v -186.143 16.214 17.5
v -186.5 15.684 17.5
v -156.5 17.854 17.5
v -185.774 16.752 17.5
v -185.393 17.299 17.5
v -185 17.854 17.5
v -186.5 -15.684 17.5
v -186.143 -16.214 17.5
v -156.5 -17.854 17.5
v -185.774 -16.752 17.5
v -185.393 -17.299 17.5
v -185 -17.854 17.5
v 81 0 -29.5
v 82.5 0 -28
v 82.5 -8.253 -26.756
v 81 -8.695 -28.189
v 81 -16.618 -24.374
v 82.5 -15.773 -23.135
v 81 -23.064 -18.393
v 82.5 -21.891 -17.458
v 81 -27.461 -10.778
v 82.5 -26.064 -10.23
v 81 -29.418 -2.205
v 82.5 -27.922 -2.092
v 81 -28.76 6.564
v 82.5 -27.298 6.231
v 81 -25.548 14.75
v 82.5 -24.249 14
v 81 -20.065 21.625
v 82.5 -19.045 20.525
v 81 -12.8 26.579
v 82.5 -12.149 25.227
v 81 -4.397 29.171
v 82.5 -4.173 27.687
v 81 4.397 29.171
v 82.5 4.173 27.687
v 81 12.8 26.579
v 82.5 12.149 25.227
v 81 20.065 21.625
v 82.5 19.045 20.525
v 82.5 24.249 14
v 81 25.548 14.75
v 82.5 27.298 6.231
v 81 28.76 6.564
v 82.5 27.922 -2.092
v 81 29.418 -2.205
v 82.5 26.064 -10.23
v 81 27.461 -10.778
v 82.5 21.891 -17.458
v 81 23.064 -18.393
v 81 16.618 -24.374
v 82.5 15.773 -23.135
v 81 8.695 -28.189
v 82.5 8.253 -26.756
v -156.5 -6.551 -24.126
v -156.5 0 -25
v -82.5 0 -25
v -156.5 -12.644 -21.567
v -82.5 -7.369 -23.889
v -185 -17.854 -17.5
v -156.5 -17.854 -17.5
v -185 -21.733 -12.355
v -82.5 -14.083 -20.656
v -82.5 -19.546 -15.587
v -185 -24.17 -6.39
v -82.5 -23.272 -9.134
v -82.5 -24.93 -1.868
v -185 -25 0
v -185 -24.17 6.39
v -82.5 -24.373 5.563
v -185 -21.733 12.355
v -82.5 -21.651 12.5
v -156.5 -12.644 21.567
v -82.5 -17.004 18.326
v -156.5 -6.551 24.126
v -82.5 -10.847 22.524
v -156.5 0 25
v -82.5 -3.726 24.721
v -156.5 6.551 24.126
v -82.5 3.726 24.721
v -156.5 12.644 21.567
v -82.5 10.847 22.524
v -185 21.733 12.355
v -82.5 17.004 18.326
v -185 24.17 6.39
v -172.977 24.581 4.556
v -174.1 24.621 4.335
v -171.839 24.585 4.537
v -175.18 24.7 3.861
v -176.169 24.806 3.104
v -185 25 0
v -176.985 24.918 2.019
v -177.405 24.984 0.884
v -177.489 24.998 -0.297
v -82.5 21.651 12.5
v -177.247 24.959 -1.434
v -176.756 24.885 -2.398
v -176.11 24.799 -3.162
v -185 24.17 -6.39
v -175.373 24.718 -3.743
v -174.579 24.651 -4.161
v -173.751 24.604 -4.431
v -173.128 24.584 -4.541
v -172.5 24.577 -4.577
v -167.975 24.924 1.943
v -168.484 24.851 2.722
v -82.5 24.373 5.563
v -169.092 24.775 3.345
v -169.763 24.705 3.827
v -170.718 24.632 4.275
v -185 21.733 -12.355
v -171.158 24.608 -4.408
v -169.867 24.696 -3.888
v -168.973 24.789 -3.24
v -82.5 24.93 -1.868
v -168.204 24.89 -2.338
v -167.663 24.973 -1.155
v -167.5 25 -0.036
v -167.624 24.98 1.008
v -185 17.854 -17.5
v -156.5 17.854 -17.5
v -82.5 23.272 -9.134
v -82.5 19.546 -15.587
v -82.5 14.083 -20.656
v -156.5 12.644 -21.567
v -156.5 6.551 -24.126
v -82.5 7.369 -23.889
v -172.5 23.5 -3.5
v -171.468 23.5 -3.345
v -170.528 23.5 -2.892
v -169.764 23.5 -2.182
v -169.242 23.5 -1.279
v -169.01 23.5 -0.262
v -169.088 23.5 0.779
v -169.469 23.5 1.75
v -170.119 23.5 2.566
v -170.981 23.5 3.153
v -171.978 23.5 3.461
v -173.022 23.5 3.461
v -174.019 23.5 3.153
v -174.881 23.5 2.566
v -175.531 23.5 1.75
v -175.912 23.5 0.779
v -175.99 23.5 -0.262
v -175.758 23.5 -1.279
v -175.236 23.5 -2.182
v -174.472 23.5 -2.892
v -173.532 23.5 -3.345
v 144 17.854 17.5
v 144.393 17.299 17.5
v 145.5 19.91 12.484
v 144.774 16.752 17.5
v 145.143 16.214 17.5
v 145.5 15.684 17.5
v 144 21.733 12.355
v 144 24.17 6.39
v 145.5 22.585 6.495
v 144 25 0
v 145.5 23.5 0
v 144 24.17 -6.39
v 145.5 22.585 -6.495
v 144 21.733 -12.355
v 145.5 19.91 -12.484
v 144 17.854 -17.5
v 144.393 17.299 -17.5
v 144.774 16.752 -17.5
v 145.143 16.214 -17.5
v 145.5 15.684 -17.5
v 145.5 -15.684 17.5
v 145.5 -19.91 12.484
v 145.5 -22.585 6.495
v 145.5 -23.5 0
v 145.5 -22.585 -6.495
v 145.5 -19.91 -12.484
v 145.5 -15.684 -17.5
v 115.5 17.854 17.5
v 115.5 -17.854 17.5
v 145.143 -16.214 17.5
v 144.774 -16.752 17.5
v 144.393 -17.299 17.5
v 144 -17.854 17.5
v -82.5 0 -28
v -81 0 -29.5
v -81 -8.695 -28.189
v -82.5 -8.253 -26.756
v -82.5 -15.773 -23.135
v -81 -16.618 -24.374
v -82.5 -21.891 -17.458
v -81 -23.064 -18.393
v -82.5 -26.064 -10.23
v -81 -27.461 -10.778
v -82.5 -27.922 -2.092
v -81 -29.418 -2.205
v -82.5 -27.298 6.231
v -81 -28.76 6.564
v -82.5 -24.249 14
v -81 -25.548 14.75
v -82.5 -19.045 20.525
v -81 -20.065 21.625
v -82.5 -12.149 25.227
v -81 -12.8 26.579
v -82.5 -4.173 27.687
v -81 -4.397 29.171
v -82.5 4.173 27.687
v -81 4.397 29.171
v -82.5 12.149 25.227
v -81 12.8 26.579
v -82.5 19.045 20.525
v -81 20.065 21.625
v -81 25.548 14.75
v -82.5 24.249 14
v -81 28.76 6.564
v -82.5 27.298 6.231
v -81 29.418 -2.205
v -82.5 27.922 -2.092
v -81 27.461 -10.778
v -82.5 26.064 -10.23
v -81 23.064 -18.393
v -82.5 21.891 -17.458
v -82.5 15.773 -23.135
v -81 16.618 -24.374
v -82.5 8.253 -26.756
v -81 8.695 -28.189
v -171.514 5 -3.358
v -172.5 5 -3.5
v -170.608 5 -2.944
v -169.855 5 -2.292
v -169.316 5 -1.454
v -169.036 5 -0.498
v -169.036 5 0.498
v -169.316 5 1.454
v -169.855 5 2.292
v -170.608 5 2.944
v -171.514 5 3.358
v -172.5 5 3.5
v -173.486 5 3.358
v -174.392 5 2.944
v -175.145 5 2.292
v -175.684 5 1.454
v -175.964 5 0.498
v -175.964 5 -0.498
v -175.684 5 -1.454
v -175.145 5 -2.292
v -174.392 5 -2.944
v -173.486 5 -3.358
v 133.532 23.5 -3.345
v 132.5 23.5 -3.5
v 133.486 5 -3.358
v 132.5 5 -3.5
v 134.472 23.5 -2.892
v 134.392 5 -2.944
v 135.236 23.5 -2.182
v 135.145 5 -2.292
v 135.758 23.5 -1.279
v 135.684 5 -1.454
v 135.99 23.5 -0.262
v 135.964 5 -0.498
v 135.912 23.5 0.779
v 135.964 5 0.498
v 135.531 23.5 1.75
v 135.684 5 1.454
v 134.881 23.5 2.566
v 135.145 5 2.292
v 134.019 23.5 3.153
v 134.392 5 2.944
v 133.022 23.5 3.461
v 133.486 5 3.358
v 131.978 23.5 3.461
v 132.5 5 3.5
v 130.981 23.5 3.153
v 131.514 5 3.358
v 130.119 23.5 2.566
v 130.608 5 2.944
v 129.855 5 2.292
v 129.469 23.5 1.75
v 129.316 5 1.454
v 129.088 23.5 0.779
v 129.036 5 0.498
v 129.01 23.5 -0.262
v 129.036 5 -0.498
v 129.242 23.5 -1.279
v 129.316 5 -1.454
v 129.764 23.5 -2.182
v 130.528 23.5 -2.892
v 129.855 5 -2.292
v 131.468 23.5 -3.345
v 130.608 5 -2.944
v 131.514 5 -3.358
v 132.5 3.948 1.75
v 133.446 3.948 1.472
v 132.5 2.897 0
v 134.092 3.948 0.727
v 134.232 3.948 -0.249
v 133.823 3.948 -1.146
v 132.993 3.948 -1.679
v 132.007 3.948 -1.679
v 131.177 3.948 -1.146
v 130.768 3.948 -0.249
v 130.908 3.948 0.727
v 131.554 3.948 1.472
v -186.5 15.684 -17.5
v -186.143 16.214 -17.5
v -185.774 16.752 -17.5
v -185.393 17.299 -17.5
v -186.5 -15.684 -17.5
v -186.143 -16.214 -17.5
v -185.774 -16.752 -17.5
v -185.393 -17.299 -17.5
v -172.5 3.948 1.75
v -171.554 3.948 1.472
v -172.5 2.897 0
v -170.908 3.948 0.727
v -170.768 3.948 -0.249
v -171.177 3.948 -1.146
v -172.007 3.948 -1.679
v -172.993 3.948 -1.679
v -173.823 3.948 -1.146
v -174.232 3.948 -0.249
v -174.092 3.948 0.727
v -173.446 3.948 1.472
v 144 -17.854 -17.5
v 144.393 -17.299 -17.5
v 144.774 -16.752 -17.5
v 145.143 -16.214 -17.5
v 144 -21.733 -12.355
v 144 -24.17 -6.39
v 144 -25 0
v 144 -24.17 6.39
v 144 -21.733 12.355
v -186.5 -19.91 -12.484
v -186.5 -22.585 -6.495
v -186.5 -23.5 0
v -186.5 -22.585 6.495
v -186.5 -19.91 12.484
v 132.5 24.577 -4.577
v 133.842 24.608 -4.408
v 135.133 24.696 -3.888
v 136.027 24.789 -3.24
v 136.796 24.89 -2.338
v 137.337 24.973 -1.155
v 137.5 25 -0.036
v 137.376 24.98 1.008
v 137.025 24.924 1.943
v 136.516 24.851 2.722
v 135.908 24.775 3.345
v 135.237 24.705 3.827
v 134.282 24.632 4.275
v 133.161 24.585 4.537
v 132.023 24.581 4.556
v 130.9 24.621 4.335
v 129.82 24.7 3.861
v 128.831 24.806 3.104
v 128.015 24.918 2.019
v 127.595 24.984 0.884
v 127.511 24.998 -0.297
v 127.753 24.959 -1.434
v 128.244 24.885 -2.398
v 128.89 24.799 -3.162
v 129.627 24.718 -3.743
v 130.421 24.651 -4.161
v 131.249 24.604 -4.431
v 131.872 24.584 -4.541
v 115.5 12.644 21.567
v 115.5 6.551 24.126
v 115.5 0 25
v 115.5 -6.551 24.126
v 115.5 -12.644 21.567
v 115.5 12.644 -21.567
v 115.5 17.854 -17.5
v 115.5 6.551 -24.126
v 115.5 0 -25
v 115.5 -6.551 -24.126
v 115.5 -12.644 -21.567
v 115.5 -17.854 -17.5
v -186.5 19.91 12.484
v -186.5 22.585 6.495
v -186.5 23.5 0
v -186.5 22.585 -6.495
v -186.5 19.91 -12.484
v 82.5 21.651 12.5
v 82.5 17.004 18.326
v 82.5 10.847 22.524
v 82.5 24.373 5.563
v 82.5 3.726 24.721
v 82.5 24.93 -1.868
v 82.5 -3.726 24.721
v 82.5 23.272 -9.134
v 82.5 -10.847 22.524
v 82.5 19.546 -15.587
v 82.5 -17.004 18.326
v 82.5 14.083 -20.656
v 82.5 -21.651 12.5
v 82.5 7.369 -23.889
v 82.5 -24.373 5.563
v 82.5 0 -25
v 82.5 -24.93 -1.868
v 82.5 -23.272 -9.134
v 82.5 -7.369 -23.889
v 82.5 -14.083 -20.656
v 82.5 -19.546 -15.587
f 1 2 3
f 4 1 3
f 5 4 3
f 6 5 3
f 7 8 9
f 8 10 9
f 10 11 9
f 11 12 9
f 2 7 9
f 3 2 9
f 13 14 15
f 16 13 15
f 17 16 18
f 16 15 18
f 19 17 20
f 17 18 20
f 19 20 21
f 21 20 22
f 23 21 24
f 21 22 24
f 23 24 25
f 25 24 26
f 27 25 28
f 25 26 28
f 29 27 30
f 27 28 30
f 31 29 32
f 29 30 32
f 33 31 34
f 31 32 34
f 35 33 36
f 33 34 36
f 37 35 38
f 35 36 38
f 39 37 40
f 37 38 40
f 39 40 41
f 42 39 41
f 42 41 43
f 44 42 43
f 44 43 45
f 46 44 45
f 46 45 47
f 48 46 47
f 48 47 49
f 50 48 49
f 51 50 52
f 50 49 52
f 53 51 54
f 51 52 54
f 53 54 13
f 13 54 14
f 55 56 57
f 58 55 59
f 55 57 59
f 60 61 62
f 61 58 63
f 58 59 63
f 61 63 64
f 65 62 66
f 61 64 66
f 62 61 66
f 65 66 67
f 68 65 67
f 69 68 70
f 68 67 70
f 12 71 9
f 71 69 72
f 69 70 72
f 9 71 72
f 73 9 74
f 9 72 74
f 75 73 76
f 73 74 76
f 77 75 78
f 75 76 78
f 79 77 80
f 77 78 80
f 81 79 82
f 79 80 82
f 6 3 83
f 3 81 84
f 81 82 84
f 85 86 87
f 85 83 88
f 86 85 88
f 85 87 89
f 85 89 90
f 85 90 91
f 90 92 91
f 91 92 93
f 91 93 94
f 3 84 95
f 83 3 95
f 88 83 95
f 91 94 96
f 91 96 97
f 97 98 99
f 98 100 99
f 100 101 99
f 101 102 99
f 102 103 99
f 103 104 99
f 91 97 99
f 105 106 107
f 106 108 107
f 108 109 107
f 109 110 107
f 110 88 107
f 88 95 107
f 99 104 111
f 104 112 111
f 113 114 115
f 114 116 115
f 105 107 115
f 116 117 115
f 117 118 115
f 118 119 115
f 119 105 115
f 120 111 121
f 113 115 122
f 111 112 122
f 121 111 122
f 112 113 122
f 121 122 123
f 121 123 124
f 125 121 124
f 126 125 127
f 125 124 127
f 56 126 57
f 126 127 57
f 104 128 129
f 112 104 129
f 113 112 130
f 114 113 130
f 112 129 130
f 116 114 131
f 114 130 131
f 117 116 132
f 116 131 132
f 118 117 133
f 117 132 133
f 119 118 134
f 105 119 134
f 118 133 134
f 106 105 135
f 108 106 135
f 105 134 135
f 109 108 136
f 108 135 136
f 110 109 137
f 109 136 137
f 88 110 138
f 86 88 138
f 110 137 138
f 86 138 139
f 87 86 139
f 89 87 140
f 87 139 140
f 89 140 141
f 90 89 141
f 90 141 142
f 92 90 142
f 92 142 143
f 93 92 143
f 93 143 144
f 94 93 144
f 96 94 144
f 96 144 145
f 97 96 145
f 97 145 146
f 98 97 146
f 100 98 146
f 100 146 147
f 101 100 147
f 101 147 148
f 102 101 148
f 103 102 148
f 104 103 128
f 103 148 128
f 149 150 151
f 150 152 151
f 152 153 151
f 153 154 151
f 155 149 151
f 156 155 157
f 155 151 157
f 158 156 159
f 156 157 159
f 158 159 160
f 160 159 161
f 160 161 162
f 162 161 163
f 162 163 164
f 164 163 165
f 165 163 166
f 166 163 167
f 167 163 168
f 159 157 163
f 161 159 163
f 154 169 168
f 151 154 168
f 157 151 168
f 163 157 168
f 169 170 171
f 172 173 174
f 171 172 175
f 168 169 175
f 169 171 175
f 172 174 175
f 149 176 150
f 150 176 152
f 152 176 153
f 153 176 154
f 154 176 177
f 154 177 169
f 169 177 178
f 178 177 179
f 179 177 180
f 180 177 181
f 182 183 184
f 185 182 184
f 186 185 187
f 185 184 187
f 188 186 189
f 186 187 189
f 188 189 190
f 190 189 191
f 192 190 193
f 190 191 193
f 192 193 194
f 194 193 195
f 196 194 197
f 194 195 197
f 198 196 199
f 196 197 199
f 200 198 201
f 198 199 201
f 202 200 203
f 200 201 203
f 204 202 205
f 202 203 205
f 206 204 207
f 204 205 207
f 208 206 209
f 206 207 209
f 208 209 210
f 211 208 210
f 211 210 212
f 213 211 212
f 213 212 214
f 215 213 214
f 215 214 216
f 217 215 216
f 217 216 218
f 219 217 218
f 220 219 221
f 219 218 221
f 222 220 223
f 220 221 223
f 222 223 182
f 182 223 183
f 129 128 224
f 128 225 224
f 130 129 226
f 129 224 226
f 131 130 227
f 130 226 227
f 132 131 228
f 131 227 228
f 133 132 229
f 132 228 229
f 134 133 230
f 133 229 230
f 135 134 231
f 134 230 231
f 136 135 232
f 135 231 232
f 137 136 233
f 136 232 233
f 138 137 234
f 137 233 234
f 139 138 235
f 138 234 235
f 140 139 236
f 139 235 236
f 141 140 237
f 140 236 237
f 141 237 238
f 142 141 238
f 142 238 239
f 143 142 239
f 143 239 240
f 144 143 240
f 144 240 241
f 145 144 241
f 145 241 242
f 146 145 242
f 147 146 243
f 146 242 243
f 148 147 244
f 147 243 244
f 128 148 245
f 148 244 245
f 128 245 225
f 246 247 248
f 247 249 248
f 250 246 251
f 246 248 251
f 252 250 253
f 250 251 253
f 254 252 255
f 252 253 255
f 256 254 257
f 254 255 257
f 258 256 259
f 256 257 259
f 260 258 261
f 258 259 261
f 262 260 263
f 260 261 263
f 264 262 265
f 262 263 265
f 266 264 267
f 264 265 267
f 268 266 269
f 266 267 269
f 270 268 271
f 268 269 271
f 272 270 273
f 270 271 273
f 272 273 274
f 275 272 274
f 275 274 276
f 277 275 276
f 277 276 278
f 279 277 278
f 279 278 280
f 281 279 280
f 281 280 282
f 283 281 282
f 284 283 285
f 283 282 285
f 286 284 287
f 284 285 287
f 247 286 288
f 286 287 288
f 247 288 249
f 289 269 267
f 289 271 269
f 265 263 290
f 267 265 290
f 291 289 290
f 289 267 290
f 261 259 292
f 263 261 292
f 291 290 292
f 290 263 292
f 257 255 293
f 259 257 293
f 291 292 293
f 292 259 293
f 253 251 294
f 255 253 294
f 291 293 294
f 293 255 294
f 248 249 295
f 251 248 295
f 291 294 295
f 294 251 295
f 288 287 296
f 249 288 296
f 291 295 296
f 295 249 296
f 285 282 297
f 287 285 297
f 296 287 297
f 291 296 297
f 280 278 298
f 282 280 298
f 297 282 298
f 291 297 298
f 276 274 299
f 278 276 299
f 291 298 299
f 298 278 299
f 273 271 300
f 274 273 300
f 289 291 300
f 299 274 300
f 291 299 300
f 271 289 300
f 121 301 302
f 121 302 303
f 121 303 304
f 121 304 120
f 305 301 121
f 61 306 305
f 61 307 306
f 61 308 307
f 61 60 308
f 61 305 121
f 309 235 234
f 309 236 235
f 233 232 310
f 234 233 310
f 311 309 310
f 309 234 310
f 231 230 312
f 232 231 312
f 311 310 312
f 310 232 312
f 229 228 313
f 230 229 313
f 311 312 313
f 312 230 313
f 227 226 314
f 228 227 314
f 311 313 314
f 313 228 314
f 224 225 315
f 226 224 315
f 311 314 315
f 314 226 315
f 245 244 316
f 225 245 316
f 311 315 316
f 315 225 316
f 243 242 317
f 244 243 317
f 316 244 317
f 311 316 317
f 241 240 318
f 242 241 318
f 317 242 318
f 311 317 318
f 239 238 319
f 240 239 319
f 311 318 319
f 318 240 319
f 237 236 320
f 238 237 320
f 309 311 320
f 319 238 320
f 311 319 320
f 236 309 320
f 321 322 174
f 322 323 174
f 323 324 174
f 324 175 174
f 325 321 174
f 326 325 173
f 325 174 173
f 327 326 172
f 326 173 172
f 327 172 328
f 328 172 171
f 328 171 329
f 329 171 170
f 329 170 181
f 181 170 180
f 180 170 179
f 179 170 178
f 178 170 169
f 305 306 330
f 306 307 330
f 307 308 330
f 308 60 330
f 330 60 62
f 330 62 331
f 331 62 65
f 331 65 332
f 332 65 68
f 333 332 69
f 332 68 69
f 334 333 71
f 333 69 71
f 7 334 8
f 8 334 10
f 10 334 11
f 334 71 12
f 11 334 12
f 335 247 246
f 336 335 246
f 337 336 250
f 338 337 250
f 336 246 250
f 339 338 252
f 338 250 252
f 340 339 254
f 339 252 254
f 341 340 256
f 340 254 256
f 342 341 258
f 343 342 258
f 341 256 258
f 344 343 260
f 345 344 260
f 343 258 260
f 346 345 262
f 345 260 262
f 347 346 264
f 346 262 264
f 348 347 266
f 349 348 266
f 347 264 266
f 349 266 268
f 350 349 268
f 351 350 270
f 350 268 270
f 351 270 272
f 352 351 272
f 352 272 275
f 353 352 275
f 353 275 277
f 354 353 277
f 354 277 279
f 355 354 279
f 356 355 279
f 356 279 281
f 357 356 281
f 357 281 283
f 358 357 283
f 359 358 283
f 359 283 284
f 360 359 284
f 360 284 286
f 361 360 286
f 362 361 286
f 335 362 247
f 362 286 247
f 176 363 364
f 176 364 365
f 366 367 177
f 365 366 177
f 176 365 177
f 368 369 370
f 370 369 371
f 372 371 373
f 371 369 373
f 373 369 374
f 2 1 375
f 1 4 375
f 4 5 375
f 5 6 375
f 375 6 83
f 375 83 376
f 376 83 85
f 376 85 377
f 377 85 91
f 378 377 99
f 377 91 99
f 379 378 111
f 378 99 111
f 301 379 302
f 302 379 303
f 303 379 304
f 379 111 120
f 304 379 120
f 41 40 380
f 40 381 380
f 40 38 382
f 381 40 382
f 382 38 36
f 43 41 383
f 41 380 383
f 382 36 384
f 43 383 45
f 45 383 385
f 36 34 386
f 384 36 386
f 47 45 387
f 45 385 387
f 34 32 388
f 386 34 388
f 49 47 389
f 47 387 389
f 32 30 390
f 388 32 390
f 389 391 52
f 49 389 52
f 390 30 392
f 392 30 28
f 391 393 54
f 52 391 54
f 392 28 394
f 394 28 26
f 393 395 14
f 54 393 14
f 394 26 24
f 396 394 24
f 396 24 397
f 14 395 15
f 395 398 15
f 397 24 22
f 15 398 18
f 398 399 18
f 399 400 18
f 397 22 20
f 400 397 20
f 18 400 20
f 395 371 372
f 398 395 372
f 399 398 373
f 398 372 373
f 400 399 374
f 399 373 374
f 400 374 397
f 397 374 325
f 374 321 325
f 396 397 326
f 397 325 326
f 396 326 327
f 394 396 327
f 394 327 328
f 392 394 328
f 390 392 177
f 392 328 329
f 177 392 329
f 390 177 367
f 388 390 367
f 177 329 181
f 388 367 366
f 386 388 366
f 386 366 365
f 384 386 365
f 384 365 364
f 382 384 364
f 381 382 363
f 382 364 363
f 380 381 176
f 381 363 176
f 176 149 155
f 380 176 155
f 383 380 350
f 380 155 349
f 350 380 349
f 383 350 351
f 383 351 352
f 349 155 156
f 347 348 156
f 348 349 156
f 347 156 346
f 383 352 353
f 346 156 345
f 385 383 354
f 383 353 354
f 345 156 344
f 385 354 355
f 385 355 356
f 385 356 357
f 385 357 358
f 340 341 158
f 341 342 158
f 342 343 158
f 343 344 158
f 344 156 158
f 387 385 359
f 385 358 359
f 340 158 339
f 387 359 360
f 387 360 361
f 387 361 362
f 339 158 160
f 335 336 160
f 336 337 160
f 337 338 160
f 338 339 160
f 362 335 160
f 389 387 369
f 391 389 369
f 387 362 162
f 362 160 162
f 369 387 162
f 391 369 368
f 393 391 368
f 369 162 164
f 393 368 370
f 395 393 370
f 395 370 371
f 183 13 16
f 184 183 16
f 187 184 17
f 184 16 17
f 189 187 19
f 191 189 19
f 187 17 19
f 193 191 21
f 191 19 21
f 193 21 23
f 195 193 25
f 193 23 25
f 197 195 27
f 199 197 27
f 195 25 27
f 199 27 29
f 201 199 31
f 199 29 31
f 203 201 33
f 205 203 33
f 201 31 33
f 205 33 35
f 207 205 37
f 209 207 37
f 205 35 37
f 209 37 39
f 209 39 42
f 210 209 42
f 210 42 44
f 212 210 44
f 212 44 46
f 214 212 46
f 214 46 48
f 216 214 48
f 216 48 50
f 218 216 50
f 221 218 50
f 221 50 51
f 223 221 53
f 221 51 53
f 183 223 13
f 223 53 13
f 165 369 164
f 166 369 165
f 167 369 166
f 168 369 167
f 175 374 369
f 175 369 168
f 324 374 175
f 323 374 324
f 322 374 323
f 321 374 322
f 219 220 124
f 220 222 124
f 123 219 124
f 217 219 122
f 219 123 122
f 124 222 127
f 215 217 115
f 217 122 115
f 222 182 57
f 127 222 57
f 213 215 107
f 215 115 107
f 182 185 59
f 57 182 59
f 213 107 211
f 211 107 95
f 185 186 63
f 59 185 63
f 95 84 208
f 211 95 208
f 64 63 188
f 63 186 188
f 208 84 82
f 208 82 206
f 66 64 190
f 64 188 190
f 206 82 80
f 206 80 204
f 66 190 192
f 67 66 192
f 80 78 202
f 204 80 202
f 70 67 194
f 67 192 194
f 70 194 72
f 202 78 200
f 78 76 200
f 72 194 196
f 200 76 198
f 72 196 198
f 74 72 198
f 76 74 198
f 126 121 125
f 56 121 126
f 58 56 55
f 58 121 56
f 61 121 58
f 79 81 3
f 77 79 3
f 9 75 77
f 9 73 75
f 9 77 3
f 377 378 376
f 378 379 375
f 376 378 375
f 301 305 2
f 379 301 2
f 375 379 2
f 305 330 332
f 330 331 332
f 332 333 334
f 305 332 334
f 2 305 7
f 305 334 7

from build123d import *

# Parameters (mm, degrees)
CUT_EXTRUDE_1_DEPTH      = 192.109261942
CUT_EXTRUDE_1_DEPTH_BACK = 192.109261942
SKETCH_2_W               = 30
SKETCH_2_H               = 7.5
CHAMFER_1_SIZE           = 1.5
M8X1_01_D                = 7
M8X1_01_DEPTH            = 20
M8X1_01_CSINK_D          = 10
M8X1_01_CSINK_ANGLE      = 90
M8X1_01_TIP              = 2.103012167


with BuildPart() as part:
    # Эскиз1 → Повернуть1 (revolve)
    with BuildSketch(Plane.XY, mode=Mode.PRIVATE) as revolve_1_sk:
        Polygon((-186.5, 0), (-186.5, 25), (-82.5, 25), (-82.5, 29.5), (82.5, 29.5), (82.5, 25), (145.5, 25), (145.5, 0), align=None)
    revolve(revolve_1_sk.sketch.rotate(Axis((0, 0, 0), (-1, 0, 0)), 90), axis=Axis((0, 0, 0), (-1, 0, 0)))

    # Эскиз2 → Вырез-Вытянуть1 (cut, two sides: drawn at the far end of the back side and taken through both)
    with BuildSketch(Plane(origin=(0, 0, 0), x_dir=(1, 0, 0), z_dir=(0, 1, 0)).offset(-CUT_EXTRUDE_1_DEPTH_BACK)):
        with Locations((-171.5, 21.25)):
            Rectangle(SKETCH_2_W, SKETCH_2_H)
        with Locations((-171.5, -21.25)):
            Rectangle(SKETCH_2_W, SKETCH_2_H)
        with Locations((130.5, 21.25)):
            Rectangle(SKETCH_2_W, SKETCH_2_H)
        with Locations((130.5, -21.25)):
            Rectangle(SKETCH_2_W, SKETCH_2_H)
    extrude(amount=CUT_EXTRUDE_1_DEPTH + CUT_EXTRUDE_1_DEPTH_BACK, mode=Mode.SUBTRACT)

    # Фаска1
    chamfer_1_edges = [part.edges().sort_by_distance(p)[0] for p in [
        (145.5, 25, 0),
        (145.5, -25, 0),
        (-186.5, 25, 0),
        (-186.5, -25, 0),
        (82.5, 0, 29.5),
        (-82.5, 0, 29.5),
    ]]
    chamfer(chamfer_1_edges, length=CHAMFER_1_SIZE)

    # Отверстие обработанное метчиком M8x1.01
    with Locations(Plane(origin=(-172.5, 25, 0), x_dir=(0, 0, 1), z_dir=(0, 1, 0))):
        with Locations((0, 0), (0, 305)):
            CounterSinkHole(M8X1_01_D / 2, M8X1_01_CSINK_D / 2, depth=M8X1_01_DEPTH, counter_sink_angle=M8X1_01_CSINK_ANGLE)
            with Locations((0, 0, -(M8X1_01_DEPTH + M8X1_01_TIP / 2))):  # 118° drill point
                Cone(0, M8X1_01_D / 2, M8X1_01_TIP, mode=Mode.SUBTRACT)


solid = part.part
